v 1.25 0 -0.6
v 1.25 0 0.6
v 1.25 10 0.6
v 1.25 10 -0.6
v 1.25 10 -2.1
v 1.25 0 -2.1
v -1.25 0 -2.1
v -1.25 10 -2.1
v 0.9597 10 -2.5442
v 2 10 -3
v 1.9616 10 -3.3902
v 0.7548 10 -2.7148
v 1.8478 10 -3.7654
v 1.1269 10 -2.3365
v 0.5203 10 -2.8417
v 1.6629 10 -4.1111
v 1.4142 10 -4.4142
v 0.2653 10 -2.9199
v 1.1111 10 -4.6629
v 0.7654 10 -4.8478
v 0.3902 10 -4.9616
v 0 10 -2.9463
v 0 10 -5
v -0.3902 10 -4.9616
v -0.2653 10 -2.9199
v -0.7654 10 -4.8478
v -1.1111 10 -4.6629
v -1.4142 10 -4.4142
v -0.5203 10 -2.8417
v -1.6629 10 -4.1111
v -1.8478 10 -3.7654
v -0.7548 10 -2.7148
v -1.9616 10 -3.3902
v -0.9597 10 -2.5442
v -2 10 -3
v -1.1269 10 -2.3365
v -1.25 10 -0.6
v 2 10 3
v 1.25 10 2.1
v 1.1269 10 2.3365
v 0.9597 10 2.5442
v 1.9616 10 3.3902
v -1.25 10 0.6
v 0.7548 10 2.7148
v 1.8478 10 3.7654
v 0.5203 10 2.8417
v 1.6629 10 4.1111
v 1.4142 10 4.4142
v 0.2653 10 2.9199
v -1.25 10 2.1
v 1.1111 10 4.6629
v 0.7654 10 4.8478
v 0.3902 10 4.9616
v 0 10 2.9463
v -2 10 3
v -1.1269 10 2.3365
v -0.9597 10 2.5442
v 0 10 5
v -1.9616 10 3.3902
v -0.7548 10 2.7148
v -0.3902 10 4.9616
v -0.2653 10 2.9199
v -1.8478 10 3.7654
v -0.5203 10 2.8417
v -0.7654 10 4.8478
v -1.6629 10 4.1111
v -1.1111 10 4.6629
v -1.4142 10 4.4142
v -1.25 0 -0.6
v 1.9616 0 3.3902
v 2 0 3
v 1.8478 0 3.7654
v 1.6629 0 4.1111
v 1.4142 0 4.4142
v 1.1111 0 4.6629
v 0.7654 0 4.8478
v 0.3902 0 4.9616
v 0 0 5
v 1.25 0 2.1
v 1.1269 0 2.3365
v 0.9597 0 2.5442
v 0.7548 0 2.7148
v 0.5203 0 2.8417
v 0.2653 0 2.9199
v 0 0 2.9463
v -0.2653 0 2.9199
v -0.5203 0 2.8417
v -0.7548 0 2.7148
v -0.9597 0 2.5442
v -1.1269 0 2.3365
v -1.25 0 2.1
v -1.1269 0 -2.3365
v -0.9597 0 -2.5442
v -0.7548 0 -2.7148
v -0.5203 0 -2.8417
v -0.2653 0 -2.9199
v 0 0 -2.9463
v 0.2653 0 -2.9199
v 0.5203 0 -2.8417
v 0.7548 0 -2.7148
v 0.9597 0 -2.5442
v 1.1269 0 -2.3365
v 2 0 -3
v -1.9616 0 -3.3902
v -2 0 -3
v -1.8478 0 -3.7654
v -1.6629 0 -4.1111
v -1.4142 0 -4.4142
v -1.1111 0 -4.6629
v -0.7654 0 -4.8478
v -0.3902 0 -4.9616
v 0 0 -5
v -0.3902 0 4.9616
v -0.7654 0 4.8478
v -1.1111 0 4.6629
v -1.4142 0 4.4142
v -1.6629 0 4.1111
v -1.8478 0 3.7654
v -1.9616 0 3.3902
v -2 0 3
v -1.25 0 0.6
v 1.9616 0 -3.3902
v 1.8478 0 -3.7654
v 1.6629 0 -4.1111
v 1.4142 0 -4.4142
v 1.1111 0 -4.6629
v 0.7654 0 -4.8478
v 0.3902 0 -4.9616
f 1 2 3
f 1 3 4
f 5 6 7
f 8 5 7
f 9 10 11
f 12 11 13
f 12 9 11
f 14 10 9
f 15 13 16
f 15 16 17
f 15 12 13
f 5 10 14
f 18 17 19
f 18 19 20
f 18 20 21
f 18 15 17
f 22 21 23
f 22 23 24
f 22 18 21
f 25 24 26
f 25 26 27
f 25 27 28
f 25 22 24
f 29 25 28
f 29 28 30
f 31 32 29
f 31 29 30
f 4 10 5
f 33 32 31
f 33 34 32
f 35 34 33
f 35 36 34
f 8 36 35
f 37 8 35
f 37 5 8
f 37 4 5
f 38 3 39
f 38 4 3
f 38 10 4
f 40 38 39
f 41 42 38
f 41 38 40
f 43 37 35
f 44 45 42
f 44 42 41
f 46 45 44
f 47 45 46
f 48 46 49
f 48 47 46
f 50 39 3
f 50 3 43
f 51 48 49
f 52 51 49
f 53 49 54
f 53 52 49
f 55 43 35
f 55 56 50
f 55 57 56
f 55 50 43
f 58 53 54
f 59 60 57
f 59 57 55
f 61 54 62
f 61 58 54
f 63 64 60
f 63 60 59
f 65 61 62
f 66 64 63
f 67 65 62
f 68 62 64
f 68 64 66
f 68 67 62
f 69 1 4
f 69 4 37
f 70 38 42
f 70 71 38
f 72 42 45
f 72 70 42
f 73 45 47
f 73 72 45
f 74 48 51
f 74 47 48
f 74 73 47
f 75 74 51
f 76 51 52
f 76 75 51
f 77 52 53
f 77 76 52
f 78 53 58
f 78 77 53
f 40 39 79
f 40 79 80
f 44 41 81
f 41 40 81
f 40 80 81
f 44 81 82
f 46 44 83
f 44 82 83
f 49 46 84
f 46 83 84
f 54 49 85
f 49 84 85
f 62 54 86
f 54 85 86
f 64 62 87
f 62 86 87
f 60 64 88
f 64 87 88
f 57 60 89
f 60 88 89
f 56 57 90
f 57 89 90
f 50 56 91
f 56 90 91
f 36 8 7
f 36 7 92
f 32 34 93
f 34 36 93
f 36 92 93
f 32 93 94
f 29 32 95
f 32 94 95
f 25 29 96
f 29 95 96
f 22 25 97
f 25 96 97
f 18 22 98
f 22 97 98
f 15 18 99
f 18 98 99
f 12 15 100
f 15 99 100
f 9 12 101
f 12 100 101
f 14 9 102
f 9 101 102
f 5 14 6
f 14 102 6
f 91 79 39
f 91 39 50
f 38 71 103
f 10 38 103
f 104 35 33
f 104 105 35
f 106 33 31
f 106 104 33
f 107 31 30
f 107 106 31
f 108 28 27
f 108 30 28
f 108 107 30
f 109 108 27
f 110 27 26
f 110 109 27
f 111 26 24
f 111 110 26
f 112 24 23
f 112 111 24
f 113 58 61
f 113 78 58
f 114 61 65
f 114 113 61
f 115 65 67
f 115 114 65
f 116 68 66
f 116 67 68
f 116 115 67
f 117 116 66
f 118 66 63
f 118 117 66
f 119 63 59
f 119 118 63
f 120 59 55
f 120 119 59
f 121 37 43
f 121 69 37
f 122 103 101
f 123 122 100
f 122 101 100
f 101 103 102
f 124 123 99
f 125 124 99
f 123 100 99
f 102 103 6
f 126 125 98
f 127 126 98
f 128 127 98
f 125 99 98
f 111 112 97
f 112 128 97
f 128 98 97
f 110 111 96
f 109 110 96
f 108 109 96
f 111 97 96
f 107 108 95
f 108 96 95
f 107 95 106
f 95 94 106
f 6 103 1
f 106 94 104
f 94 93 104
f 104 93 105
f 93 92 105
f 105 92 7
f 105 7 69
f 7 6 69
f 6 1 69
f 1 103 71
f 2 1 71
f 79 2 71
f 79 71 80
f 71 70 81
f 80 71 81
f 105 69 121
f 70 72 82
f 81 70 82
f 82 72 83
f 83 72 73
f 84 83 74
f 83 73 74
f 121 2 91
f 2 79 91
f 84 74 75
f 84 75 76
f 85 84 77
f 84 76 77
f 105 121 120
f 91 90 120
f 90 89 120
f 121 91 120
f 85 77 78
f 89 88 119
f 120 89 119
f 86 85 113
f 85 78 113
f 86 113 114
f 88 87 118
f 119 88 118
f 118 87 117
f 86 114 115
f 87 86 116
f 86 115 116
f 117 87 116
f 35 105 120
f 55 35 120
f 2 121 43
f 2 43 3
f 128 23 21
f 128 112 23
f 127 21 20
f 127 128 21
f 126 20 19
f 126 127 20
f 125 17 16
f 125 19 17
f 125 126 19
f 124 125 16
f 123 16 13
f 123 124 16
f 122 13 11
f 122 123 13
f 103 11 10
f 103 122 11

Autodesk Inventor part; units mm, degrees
ref_plane "YZ Plane" through (0, 0, 0) normal (1, 0, 0) x (0, 1, 0)
ref_plane "XZ Plane" through (0, 0, 0) normal (0, 1, 0) x (-1, 0, 0)
ref_plane "XY Plane" through (0, 0, 0) normal (0, 0, 1) x (1, 0, 0)
sketch "Sketch1" plane through (0, 0, 0) normal (0, 1, 0) x (-1, 0, 0)
  line L0 (0, 5) -> (0, 5)
  line L1 (-2, 3) -> (-2, -3)
  line L2 (0, -5) -> (0, -5)
  line L3 (2, -3) -> (2, 3)
  line L4 (2, 5) -> (-2, -5) construction
  line L5 (-2, 5) -> (2, -5) construction
  arc A0 (2, 3) -> (0, 5) centre (0, 3) ccw
  arc A1 (0, -5) -> (2, -3) centre (0, -3) ccw
  arc A2 (-2, -3) -> (0, -5) centre (0, -3) ccw
  arc A3 (0, 5) -> (-2, 3) centre (0, 3) ccw
  line L6 (1.25, 0.6) -> (-1.25, 0.6)
  line L7 (-1.25, 0.6) -> (-1.25, -0.6)
  line L8 (-1.25, -0.6) -> (1.25, -0.6)
  line L9 (1.25, -0.6) -> (1.25, 0.6)
  line L10 (1.25, 0.6) -> (-1.25, -0.6) construction
  line L11 (-1.25, 0.6) -> (1.25, -0.6) construction
  arc A4 (-1.25, -2.1) -> (1.25, -2.1) centre (0, -1.6) ccw
  line L12 (-1.25, -2.1) -> (1.25, -2.1)
  line L13 (2, 0) -> (-2.9121, 0) construction
  arc A5 (1.25, 2.1) -> (-1.25, 2.1) centre (0, 1.6) ccw
  line L14 (-1.25, 2.1) -> (1.25, 2.1)
  point P0 (0, 0)
  dimension "d0" = 10
  dimension "d1" = 4
  dimension "d2" = 2
  dimension "d3" = 1.2
  dimension "d4" = 2.5
  dimension "d5" = 1.5
  dimension "d6" = 1.5
  dimension "d7" = 1
  dimension "d8" = 1.3463
  dimension "d9" = 0.75
extrude "Extrusion1" add sketch "Sketch1" along normal blind 10
properties part number "Pressure sensor connector" material "PET Plastic"
